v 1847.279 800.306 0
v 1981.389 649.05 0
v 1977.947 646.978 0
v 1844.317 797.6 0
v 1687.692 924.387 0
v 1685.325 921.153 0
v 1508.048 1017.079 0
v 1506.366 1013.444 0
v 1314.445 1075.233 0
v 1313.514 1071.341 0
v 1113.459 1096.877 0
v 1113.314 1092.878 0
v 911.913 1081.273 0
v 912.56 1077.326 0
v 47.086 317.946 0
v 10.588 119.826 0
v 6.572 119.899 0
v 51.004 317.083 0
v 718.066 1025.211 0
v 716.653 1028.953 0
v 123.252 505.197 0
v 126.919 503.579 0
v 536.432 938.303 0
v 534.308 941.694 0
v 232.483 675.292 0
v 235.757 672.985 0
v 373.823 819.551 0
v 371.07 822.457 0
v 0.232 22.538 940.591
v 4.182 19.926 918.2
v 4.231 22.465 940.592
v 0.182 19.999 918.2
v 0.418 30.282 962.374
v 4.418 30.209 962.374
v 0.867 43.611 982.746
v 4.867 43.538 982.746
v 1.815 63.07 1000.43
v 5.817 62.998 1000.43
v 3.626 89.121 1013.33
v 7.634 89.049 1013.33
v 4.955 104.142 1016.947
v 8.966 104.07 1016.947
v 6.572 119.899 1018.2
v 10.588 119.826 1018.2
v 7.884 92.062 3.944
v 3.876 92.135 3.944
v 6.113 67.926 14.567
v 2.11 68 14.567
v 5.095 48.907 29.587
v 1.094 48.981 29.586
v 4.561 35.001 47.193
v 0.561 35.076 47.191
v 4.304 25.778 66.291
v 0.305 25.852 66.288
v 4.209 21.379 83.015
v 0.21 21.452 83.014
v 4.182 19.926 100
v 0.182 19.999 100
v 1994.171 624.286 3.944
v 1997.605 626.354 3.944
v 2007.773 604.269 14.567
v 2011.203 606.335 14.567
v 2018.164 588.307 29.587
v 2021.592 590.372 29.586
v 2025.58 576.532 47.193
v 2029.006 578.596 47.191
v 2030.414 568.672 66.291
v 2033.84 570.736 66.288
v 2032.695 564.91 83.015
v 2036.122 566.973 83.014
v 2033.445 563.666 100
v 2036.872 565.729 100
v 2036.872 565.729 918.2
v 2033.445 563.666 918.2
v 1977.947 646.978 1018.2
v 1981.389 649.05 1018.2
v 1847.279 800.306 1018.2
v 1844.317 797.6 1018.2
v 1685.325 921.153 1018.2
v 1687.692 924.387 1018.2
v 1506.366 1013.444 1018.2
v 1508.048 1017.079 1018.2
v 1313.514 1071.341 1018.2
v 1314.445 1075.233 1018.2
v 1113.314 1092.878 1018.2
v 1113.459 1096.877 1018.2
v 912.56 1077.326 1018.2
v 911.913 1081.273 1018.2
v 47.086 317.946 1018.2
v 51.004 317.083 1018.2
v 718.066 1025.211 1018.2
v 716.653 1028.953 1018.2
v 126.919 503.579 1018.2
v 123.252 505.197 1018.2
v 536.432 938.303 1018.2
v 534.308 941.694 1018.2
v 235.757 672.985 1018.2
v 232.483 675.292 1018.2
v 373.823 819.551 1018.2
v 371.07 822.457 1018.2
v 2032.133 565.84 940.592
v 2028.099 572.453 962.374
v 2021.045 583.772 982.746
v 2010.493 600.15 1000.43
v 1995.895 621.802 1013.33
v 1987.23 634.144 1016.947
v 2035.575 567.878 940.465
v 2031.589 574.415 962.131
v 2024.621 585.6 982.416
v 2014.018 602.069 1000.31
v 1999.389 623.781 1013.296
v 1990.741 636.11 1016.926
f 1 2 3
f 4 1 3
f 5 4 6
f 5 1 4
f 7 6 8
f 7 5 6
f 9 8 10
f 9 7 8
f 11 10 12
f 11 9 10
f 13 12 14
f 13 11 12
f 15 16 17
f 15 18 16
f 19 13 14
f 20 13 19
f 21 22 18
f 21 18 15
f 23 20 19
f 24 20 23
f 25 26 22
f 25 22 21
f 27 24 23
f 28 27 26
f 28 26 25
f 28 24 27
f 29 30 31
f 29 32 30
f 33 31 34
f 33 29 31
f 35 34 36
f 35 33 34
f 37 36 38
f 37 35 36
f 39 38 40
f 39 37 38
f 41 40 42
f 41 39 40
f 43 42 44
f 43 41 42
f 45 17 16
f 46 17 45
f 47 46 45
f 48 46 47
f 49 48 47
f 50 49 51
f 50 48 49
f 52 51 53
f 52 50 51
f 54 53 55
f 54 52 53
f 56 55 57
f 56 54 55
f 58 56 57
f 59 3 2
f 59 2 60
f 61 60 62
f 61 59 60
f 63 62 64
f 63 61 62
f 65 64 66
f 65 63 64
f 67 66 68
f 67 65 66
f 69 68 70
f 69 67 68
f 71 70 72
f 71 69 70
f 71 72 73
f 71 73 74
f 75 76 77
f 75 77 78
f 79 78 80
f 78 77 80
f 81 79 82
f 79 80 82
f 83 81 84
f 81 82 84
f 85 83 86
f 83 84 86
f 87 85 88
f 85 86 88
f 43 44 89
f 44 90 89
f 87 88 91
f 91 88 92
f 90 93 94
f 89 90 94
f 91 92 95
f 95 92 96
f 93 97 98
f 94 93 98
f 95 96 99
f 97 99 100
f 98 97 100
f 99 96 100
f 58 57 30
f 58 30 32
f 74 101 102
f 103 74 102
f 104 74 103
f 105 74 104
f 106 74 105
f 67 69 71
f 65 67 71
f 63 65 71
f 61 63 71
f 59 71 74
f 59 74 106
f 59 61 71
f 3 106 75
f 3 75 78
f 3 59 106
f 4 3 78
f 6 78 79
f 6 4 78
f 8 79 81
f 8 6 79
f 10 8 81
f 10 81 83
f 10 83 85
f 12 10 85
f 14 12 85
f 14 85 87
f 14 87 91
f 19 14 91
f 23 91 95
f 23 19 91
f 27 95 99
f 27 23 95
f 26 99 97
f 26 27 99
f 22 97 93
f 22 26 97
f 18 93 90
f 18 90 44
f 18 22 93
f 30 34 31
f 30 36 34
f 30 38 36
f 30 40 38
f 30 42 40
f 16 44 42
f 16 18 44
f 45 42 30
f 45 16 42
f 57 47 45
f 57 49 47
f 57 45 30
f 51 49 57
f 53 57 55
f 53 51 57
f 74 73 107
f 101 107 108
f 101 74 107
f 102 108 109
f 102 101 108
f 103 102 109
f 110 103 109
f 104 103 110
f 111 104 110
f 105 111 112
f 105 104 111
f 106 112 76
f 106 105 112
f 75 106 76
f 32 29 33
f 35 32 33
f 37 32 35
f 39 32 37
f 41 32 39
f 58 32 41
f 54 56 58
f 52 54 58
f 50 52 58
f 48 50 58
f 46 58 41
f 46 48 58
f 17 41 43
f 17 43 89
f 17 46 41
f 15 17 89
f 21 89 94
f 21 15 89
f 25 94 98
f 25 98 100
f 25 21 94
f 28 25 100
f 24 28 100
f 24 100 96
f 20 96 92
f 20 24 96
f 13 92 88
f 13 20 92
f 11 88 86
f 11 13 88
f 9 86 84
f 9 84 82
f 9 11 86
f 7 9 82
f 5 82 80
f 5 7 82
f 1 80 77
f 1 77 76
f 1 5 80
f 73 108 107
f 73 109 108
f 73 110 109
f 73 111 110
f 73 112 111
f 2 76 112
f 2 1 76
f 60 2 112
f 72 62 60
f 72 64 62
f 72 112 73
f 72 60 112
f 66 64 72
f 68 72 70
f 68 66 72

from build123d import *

# Parameters (mm, degrees)
BOSS_EXTRUDE1_DEPTH = 1018.2
FILLET1_START       = -1
FILLET1_DEPTH       = 10
FILLET1_START_2     = 2027
FILLET1_2_DEPTH     = 11


with BuildPart() as part:
    # Sketch1 → Boss-Extrude1 (new body)
    with BuildSketch(Plane.XY):
        with BuildLine():
            Line((2036.872393674, 565.728630714), (2033.445329339, 563.665809819))
            ThreePointArc((2033.445329339, 563.665809819), (814.110783703, 1055.756928134), (4.181650628, 19.926245878))
            Line((4.181650628, 19.926245878), (0.182315406, 19.99916901))
            ThreePointArc((0.182315406, 19.99916901), (813.075507523, 1059.620631439), (2036.872393674, 565.728630714))
        make_face()
    extrude(amount=BOSS_EXTRUDE1_DEPTH)

    # Fillet1: read off the stored shape, not the designer's step
    # Fillet1 outline → Fillet1 (cut)
    with BuildSketch(Plane(origin=(0, 0, 0), x_dir=(0.018230783053814693, 0.9998338054643106, 0), z_dir=(0.9998338054643106, -0.018230783053814693, 0)).offset(FILLET1_START)):
        with BuildLine():
            ThreePointArc((119.99916901, 0), (49.288490891, 29.289321881), (19.99916901, 100))
            Line((19.99916901, 100), (19.99916901, 0))
            Line((19.99916901, 0), (119.99916901, 0))
        make_face()
        with BuildLine():
            ThreePointArc((19.99916901, 918.2), (49.288490891, 988.910678119), (119.99916901, 1018.2))
            Line((119.99916901, 1018.2), (19.99916901, 1018.2))
            Line((19.99916901, 1018.2), (19.99916901, 918.2))
        make_face()
    extrude(amount=FILLET1_DEPTH, mode=Mode.SUBTRACT)

    # Fillet1 2 outline → Fillet1 2 (cut)
    with BuildSketch(Plane(origin=(0, 0, 0), x_dir=(0.5157052239876767, -0.8567660835676328, 0), z_dir=(0.8567660835676328, 0.515705223987677, 0)).offset(FILLET1_START_2)):
        with BuildLine():
            Line((565.728630715, 0), (465.728630715, 0))
            ThreePointArc((465.728630715, 0), (536.439308834, -29.289321881), (565.728630715, -100))
            Line((565.728630715, -100), (565.728630715, 0))
        make_face()
        with BuildLine():
            Line((565.728630715, -1018.2), (565.728630715, -918.2))
            ThreePointArc((565.728630715, -918.2), (536.439308834, -988.910678119), (465.728630715, -1018.2))
            Line((465.728630715, -1018.2), (565.728630715, -1018.2))
        make_face()
    extrude(amount=FILLET1_2_DEPTH, mode=Mode.SUBTRACT)


solid = part.part
